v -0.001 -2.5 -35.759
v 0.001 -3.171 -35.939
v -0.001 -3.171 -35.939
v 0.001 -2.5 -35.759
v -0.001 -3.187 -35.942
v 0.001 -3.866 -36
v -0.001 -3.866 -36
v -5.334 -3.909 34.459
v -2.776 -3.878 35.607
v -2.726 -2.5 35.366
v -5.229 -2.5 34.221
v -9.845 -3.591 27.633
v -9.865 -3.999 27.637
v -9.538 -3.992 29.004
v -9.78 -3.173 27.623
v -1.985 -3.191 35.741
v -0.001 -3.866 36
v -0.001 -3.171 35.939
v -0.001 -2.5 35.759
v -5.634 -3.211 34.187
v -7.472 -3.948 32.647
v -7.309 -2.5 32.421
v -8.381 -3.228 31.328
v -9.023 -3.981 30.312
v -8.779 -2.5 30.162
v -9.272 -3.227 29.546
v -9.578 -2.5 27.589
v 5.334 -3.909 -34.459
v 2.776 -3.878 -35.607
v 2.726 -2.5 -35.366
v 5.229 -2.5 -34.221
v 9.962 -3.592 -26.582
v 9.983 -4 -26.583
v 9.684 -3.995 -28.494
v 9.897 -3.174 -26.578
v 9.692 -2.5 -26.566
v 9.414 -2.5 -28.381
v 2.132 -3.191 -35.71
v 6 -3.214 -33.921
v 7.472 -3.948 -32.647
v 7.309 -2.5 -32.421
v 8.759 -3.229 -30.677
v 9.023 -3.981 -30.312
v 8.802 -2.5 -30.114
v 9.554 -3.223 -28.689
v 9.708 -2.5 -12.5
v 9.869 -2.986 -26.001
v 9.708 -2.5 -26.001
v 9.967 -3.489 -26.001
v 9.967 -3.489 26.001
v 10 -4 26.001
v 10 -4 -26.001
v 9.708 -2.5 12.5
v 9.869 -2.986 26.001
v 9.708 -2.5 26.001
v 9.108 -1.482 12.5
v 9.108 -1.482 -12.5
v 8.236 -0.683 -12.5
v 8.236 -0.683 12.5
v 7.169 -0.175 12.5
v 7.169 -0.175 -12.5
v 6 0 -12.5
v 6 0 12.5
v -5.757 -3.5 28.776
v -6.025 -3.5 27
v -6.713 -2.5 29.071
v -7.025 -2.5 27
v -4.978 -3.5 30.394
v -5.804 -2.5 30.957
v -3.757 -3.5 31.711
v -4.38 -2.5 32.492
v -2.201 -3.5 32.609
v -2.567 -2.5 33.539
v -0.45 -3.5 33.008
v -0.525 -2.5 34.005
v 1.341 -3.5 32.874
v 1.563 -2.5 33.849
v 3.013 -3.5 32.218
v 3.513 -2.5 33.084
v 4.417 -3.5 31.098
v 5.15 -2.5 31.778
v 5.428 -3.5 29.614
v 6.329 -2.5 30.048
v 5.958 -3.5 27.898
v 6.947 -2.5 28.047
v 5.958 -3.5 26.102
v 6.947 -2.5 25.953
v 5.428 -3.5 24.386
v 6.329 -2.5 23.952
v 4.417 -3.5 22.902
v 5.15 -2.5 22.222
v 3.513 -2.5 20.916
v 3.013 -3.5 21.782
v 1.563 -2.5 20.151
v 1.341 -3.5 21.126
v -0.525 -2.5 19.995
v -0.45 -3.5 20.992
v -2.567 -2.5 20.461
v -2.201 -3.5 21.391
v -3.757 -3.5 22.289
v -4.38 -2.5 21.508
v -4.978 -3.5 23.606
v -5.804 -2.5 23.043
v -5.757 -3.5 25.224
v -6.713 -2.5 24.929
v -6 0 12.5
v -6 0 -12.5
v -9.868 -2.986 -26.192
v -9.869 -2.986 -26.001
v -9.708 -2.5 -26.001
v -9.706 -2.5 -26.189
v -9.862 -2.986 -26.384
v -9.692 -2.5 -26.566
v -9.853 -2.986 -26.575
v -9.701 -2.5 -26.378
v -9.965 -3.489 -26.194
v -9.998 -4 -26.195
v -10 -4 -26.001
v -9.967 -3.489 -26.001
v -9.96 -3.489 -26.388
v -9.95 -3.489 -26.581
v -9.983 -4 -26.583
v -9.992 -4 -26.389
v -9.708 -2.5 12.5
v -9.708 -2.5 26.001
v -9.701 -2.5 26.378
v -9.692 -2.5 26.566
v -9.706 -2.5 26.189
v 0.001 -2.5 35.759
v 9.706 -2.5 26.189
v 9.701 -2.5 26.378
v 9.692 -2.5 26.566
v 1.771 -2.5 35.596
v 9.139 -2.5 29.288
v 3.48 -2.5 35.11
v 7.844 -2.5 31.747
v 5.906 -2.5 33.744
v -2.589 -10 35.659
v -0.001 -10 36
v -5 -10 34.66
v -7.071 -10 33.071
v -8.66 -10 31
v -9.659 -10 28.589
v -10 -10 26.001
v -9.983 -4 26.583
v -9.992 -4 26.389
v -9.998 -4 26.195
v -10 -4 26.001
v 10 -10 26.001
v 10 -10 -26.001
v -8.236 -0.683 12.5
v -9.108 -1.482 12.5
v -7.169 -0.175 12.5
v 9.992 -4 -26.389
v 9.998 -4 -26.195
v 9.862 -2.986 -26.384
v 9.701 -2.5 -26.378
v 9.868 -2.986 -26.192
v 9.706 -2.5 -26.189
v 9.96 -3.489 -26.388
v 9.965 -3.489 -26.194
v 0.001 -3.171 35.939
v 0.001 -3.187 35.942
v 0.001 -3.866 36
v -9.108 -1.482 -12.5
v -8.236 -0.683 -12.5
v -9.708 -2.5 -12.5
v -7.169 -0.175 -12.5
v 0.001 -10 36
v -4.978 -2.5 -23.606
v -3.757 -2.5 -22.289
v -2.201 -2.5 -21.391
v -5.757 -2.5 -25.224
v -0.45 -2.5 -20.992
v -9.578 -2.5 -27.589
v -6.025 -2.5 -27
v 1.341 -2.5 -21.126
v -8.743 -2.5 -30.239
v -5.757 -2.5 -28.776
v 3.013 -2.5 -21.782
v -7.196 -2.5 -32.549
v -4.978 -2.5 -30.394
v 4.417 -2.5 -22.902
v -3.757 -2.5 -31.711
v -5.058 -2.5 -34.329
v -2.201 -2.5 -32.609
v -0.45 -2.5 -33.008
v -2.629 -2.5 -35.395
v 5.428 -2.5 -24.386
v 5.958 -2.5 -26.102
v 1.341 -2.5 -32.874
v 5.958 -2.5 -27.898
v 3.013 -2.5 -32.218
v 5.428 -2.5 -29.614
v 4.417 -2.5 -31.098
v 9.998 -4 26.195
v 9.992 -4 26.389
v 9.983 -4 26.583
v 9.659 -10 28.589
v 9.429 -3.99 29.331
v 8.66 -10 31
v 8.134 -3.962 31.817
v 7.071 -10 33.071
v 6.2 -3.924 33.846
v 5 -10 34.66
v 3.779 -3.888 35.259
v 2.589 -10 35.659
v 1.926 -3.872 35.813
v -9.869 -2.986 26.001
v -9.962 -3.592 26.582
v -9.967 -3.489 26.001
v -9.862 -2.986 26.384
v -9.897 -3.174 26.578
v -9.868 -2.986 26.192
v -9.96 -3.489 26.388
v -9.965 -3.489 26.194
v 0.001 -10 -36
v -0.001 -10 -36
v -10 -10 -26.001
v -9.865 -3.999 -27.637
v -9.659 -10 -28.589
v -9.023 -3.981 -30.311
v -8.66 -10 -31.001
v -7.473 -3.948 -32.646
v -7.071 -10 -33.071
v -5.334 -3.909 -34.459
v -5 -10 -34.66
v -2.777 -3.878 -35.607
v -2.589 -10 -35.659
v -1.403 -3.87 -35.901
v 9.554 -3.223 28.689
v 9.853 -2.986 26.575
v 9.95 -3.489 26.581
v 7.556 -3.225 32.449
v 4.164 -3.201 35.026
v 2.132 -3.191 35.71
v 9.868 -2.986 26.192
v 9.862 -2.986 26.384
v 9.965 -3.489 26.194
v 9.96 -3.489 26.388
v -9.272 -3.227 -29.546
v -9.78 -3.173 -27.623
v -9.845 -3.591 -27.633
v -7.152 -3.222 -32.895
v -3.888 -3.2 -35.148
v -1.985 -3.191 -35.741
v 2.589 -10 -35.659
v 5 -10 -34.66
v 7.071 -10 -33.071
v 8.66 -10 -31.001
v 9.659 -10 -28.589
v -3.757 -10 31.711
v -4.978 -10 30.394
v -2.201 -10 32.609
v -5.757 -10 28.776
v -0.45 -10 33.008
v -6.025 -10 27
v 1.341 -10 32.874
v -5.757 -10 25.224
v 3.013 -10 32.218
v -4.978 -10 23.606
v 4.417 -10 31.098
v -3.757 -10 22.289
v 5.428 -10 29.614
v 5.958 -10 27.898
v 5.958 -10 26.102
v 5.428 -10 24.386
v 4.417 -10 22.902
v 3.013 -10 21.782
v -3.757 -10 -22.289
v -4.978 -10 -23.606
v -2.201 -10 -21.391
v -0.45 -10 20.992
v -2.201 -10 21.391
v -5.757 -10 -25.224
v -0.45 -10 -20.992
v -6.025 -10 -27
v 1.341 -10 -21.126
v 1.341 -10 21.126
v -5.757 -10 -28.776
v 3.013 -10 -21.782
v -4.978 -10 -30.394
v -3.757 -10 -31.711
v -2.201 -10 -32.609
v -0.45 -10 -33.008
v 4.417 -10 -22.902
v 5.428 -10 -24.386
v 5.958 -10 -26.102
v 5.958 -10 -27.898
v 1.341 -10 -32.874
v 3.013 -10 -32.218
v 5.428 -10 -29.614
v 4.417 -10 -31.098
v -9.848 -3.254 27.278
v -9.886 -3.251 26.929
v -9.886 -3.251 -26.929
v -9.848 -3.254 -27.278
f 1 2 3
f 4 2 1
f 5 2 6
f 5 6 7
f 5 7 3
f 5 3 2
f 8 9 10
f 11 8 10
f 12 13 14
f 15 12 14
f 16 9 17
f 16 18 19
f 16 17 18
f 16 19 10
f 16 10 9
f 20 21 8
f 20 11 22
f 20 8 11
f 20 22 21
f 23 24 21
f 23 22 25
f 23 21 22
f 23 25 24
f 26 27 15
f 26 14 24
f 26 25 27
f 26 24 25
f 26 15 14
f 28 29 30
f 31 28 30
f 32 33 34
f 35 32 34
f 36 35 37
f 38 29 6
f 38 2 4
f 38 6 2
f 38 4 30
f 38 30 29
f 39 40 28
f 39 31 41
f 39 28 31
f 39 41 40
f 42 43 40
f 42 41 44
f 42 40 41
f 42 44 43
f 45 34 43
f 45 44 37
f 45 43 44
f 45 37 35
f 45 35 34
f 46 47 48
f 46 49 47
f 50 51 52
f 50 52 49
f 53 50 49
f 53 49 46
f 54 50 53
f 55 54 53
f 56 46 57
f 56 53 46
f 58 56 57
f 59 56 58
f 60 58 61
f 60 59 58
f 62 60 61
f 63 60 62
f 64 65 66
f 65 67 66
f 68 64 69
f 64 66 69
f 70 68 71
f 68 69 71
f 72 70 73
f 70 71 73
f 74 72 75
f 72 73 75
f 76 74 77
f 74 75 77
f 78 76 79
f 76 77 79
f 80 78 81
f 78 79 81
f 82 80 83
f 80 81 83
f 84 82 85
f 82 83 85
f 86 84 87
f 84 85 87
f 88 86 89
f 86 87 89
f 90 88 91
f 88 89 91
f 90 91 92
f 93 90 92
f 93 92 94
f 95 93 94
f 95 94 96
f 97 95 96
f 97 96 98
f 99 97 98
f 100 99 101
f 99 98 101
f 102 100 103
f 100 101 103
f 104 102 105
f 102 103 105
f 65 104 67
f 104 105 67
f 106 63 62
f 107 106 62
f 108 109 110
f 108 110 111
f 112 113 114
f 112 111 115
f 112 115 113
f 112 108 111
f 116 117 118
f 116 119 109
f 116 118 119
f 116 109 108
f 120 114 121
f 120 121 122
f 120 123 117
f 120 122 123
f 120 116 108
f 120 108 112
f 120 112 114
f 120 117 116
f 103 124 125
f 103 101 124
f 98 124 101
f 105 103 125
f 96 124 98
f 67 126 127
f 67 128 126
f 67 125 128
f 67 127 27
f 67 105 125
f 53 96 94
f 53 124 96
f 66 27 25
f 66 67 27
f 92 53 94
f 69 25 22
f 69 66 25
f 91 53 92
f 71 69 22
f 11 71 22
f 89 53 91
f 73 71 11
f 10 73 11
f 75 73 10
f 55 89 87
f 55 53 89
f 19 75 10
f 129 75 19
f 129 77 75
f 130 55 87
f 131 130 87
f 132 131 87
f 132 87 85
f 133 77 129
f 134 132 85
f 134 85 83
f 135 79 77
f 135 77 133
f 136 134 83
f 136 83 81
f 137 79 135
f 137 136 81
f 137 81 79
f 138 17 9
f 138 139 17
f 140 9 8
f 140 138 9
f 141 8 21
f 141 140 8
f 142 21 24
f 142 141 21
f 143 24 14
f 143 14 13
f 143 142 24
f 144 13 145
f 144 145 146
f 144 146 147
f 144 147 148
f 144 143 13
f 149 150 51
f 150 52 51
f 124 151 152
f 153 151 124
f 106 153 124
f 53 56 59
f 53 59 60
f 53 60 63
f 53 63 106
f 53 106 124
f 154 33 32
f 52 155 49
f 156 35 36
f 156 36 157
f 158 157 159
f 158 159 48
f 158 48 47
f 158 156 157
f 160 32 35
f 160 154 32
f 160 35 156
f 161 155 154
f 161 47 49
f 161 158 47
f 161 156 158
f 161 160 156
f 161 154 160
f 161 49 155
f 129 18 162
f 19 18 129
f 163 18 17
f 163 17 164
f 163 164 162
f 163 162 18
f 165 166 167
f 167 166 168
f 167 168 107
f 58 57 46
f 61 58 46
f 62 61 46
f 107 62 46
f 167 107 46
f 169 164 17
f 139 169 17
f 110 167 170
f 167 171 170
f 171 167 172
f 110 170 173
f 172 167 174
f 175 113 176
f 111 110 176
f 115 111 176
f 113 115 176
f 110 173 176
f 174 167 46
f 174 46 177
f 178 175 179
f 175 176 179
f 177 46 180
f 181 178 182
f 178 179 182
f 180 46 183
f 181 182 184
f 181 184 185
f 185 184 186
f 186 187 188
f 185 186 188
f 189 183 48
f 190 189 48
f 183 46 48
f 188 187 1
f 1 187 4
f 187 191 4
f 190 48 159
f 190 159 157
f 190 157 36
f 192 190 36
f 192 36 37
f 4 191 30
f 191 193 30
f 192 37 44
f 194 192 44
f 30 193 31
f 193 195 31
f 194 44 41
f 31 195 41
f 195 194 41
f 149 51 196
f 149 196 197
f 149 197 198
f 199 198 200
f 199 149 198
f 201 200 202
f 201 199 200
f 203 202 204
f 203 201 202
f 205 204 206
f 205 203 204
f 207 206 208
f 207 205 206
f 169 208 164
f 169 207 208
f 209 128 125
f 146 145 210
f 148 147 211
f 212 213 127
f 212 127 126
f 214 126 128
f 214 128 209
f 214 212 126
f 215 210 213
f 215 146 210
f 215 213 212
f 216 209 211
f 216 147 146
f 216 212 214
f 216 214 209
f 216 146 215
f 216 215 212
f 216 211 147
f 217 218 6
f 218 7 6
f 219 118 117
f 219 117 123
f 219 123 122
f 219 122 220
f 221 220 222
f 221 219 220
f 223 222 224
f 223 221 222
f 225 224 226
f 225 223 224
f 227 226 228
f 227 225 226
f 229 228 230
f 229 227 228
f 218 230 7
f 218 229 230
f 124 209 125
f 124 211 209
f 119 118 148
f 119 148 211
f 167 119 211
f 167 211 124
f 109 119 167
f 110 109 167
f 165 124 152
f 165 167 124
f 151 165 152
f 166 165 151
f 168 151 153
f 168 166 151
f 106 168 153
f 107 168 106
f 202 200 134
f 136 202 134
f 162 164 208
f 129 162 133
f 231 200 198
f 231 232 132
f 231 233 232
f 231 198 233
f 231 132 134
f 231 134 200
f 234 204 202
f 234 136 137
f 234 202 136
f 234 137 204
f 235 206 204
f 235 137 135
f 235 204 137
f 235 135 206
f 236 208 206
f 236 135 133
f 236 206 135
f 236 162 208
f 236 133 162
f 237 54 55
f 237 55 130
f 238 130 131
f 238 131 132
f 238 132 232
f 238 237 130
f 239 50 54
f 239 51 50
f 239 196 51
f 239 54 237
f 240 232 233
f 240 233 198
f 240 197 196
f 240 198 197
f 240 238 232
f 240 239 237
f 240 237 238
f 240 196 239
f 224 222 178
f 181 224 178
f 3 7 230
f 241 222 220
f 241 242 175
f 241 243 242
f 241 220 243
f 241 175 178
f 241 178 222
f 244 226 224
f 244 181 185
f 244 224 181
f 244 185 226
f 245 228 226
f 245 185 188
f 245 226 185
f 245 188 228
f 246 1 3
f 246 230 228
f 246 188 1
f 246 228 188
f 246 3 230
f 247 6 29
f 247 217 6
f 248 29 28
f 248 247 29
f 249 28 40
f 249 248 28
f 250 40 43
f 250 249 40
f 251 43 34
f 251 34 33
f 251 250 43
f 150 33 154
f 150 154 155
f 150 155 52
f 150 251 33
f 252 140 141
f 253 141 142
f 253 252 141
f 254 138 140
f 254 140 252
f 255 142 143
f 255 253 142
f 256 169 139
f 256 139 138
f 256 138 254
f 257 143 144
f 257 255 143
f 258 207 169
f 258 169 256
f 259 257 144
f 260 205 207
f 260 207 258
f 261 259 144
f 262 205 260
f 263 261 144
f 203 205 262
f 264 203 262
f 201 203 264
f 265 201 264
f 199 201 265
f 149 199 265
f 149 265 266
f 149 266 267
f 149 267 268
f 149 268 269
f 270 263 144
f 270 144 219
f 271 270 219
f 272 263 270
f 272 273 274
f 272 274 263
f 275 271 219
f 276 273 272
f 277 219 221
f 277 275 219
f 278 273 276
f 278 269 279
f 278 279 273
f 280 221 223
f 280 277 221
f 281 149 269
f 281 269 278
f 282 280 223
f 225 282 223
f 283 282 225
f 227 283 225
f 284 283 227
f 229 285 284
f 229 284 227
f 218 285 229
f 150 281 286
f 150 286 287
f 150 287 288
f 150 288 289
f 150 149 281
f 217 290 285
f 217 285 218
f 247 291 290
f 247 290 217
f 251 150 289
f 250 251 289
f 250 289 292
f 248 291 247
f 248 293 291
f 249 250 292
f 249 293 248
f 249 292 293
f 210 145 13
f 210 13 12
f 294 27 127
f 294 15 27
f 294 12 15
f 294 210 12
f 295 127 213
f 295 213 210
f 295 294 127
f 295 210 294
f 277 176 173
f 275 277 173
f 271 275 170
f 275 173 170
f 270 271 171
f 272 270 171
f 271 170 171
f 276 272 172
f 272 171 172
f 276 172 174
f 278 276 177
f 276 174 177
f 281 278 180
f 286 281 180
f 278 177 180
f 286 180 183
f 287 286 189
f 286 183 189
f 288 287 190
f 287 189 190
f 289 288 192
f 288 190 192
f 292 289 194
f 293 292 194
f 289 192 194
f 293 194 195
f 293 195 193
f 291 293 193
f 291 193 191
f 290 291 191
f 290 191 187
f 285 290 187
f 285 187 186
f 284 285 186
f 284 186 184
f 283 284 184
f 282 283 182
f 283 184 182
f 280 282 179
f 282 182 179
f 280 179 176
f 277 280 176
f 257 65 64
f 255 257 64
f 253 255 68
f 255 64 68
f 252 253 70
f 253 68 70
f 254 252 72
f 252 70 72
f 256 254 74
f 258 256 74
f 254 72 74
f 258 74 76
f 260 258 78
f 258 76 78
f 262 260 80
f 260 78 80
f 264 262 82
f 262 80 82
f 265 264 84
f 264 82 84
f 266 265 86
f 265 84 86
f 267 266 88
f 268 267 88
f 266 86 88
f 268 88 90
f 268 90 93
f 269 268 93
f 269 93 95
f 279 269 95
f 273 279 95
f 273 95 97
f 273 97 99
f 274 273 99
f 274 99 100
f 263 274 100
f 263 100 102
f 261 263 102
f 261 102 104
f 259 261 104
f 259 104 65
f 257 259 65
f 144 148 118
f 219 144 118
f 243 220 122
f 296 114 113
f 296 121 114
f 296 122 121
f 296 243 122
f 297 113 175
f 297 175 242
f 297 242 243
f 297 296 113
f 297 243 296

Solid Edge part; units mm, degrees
sketch "Sketch1" plane through (0, 0, 0) normal (0, -1, 0) x (1, 0, 0)
  line L0 (-10, -36) -> (10, -36)
  line L1 (10, -36) -> (10, 36)
  line L2 (10, 36) -> (-10, 36)
  line L3 (-10, 36) -> (-10, -36)
  dimension "D1" = 72
  dimension "D2" = 20
extrude "Protrusion1" add sketch "Sketch1" along normal blind 10
sketch "Sketch2" plane through (0, 0, 0) normal (0, 1, 0) x (-1, 0, 0)
  circle A0 centre (0, 27) radius 6.025
  circle A1 centre (0, -27) radius 6.025
  dimension "D1" = 12.05
  dimension "D2" = 54
extrude "Cutout1" cut sketch "Sketch2" against normal through all
fillet "Verrundung_1" radius 10 4 edges at (-10, -5, 36) (10, -5, 36) (-10, -5, -36) (10, -5, -36)
fillet "Verrundung_2" radius 4 3 edges at (-10, 0, 0) (10, 0, 0) (0, 0, 36)
sketch "Sketch3" plane through (10, -7, 0) normal (1, 0, 0) x (0, 0, -1)
  line L0 (-12.5, 4.5) -> (-37.5, 4.5)
  line L1 (-37.5, 4.5) -> (-37.5, 10.5)
  line L2 (-37.5, 10.5) -> (-12.5, 10.5)
  line L3 (-12.5, 10.5) -> (-12.5, 4.5)
  line L4 (12.5, 4.5) -> (37.5, 4.5)
  line L5 (37.5, 4.5) -> (37.5, 10.5)
  line L6 (37.5, 10.5) -> (12.5, 10.5)
  line L7 (12.5, 10.5) -> (12.5, 4.5)
  dimension "D1" = 7.5
  dimension "D2" = 7.5
  dimension "D3" = 25
  dimension "D4" = 6
  dimension "D5" = 10.5
  dimension "D6" = 25
  dimension "D7" = 25
extrude "Cutout2" cut sketch "Sketch3" against normal through all
chamfer "Fase_1" distance 1 angle 45 1 edges at (0, -2.5, 20.975)
